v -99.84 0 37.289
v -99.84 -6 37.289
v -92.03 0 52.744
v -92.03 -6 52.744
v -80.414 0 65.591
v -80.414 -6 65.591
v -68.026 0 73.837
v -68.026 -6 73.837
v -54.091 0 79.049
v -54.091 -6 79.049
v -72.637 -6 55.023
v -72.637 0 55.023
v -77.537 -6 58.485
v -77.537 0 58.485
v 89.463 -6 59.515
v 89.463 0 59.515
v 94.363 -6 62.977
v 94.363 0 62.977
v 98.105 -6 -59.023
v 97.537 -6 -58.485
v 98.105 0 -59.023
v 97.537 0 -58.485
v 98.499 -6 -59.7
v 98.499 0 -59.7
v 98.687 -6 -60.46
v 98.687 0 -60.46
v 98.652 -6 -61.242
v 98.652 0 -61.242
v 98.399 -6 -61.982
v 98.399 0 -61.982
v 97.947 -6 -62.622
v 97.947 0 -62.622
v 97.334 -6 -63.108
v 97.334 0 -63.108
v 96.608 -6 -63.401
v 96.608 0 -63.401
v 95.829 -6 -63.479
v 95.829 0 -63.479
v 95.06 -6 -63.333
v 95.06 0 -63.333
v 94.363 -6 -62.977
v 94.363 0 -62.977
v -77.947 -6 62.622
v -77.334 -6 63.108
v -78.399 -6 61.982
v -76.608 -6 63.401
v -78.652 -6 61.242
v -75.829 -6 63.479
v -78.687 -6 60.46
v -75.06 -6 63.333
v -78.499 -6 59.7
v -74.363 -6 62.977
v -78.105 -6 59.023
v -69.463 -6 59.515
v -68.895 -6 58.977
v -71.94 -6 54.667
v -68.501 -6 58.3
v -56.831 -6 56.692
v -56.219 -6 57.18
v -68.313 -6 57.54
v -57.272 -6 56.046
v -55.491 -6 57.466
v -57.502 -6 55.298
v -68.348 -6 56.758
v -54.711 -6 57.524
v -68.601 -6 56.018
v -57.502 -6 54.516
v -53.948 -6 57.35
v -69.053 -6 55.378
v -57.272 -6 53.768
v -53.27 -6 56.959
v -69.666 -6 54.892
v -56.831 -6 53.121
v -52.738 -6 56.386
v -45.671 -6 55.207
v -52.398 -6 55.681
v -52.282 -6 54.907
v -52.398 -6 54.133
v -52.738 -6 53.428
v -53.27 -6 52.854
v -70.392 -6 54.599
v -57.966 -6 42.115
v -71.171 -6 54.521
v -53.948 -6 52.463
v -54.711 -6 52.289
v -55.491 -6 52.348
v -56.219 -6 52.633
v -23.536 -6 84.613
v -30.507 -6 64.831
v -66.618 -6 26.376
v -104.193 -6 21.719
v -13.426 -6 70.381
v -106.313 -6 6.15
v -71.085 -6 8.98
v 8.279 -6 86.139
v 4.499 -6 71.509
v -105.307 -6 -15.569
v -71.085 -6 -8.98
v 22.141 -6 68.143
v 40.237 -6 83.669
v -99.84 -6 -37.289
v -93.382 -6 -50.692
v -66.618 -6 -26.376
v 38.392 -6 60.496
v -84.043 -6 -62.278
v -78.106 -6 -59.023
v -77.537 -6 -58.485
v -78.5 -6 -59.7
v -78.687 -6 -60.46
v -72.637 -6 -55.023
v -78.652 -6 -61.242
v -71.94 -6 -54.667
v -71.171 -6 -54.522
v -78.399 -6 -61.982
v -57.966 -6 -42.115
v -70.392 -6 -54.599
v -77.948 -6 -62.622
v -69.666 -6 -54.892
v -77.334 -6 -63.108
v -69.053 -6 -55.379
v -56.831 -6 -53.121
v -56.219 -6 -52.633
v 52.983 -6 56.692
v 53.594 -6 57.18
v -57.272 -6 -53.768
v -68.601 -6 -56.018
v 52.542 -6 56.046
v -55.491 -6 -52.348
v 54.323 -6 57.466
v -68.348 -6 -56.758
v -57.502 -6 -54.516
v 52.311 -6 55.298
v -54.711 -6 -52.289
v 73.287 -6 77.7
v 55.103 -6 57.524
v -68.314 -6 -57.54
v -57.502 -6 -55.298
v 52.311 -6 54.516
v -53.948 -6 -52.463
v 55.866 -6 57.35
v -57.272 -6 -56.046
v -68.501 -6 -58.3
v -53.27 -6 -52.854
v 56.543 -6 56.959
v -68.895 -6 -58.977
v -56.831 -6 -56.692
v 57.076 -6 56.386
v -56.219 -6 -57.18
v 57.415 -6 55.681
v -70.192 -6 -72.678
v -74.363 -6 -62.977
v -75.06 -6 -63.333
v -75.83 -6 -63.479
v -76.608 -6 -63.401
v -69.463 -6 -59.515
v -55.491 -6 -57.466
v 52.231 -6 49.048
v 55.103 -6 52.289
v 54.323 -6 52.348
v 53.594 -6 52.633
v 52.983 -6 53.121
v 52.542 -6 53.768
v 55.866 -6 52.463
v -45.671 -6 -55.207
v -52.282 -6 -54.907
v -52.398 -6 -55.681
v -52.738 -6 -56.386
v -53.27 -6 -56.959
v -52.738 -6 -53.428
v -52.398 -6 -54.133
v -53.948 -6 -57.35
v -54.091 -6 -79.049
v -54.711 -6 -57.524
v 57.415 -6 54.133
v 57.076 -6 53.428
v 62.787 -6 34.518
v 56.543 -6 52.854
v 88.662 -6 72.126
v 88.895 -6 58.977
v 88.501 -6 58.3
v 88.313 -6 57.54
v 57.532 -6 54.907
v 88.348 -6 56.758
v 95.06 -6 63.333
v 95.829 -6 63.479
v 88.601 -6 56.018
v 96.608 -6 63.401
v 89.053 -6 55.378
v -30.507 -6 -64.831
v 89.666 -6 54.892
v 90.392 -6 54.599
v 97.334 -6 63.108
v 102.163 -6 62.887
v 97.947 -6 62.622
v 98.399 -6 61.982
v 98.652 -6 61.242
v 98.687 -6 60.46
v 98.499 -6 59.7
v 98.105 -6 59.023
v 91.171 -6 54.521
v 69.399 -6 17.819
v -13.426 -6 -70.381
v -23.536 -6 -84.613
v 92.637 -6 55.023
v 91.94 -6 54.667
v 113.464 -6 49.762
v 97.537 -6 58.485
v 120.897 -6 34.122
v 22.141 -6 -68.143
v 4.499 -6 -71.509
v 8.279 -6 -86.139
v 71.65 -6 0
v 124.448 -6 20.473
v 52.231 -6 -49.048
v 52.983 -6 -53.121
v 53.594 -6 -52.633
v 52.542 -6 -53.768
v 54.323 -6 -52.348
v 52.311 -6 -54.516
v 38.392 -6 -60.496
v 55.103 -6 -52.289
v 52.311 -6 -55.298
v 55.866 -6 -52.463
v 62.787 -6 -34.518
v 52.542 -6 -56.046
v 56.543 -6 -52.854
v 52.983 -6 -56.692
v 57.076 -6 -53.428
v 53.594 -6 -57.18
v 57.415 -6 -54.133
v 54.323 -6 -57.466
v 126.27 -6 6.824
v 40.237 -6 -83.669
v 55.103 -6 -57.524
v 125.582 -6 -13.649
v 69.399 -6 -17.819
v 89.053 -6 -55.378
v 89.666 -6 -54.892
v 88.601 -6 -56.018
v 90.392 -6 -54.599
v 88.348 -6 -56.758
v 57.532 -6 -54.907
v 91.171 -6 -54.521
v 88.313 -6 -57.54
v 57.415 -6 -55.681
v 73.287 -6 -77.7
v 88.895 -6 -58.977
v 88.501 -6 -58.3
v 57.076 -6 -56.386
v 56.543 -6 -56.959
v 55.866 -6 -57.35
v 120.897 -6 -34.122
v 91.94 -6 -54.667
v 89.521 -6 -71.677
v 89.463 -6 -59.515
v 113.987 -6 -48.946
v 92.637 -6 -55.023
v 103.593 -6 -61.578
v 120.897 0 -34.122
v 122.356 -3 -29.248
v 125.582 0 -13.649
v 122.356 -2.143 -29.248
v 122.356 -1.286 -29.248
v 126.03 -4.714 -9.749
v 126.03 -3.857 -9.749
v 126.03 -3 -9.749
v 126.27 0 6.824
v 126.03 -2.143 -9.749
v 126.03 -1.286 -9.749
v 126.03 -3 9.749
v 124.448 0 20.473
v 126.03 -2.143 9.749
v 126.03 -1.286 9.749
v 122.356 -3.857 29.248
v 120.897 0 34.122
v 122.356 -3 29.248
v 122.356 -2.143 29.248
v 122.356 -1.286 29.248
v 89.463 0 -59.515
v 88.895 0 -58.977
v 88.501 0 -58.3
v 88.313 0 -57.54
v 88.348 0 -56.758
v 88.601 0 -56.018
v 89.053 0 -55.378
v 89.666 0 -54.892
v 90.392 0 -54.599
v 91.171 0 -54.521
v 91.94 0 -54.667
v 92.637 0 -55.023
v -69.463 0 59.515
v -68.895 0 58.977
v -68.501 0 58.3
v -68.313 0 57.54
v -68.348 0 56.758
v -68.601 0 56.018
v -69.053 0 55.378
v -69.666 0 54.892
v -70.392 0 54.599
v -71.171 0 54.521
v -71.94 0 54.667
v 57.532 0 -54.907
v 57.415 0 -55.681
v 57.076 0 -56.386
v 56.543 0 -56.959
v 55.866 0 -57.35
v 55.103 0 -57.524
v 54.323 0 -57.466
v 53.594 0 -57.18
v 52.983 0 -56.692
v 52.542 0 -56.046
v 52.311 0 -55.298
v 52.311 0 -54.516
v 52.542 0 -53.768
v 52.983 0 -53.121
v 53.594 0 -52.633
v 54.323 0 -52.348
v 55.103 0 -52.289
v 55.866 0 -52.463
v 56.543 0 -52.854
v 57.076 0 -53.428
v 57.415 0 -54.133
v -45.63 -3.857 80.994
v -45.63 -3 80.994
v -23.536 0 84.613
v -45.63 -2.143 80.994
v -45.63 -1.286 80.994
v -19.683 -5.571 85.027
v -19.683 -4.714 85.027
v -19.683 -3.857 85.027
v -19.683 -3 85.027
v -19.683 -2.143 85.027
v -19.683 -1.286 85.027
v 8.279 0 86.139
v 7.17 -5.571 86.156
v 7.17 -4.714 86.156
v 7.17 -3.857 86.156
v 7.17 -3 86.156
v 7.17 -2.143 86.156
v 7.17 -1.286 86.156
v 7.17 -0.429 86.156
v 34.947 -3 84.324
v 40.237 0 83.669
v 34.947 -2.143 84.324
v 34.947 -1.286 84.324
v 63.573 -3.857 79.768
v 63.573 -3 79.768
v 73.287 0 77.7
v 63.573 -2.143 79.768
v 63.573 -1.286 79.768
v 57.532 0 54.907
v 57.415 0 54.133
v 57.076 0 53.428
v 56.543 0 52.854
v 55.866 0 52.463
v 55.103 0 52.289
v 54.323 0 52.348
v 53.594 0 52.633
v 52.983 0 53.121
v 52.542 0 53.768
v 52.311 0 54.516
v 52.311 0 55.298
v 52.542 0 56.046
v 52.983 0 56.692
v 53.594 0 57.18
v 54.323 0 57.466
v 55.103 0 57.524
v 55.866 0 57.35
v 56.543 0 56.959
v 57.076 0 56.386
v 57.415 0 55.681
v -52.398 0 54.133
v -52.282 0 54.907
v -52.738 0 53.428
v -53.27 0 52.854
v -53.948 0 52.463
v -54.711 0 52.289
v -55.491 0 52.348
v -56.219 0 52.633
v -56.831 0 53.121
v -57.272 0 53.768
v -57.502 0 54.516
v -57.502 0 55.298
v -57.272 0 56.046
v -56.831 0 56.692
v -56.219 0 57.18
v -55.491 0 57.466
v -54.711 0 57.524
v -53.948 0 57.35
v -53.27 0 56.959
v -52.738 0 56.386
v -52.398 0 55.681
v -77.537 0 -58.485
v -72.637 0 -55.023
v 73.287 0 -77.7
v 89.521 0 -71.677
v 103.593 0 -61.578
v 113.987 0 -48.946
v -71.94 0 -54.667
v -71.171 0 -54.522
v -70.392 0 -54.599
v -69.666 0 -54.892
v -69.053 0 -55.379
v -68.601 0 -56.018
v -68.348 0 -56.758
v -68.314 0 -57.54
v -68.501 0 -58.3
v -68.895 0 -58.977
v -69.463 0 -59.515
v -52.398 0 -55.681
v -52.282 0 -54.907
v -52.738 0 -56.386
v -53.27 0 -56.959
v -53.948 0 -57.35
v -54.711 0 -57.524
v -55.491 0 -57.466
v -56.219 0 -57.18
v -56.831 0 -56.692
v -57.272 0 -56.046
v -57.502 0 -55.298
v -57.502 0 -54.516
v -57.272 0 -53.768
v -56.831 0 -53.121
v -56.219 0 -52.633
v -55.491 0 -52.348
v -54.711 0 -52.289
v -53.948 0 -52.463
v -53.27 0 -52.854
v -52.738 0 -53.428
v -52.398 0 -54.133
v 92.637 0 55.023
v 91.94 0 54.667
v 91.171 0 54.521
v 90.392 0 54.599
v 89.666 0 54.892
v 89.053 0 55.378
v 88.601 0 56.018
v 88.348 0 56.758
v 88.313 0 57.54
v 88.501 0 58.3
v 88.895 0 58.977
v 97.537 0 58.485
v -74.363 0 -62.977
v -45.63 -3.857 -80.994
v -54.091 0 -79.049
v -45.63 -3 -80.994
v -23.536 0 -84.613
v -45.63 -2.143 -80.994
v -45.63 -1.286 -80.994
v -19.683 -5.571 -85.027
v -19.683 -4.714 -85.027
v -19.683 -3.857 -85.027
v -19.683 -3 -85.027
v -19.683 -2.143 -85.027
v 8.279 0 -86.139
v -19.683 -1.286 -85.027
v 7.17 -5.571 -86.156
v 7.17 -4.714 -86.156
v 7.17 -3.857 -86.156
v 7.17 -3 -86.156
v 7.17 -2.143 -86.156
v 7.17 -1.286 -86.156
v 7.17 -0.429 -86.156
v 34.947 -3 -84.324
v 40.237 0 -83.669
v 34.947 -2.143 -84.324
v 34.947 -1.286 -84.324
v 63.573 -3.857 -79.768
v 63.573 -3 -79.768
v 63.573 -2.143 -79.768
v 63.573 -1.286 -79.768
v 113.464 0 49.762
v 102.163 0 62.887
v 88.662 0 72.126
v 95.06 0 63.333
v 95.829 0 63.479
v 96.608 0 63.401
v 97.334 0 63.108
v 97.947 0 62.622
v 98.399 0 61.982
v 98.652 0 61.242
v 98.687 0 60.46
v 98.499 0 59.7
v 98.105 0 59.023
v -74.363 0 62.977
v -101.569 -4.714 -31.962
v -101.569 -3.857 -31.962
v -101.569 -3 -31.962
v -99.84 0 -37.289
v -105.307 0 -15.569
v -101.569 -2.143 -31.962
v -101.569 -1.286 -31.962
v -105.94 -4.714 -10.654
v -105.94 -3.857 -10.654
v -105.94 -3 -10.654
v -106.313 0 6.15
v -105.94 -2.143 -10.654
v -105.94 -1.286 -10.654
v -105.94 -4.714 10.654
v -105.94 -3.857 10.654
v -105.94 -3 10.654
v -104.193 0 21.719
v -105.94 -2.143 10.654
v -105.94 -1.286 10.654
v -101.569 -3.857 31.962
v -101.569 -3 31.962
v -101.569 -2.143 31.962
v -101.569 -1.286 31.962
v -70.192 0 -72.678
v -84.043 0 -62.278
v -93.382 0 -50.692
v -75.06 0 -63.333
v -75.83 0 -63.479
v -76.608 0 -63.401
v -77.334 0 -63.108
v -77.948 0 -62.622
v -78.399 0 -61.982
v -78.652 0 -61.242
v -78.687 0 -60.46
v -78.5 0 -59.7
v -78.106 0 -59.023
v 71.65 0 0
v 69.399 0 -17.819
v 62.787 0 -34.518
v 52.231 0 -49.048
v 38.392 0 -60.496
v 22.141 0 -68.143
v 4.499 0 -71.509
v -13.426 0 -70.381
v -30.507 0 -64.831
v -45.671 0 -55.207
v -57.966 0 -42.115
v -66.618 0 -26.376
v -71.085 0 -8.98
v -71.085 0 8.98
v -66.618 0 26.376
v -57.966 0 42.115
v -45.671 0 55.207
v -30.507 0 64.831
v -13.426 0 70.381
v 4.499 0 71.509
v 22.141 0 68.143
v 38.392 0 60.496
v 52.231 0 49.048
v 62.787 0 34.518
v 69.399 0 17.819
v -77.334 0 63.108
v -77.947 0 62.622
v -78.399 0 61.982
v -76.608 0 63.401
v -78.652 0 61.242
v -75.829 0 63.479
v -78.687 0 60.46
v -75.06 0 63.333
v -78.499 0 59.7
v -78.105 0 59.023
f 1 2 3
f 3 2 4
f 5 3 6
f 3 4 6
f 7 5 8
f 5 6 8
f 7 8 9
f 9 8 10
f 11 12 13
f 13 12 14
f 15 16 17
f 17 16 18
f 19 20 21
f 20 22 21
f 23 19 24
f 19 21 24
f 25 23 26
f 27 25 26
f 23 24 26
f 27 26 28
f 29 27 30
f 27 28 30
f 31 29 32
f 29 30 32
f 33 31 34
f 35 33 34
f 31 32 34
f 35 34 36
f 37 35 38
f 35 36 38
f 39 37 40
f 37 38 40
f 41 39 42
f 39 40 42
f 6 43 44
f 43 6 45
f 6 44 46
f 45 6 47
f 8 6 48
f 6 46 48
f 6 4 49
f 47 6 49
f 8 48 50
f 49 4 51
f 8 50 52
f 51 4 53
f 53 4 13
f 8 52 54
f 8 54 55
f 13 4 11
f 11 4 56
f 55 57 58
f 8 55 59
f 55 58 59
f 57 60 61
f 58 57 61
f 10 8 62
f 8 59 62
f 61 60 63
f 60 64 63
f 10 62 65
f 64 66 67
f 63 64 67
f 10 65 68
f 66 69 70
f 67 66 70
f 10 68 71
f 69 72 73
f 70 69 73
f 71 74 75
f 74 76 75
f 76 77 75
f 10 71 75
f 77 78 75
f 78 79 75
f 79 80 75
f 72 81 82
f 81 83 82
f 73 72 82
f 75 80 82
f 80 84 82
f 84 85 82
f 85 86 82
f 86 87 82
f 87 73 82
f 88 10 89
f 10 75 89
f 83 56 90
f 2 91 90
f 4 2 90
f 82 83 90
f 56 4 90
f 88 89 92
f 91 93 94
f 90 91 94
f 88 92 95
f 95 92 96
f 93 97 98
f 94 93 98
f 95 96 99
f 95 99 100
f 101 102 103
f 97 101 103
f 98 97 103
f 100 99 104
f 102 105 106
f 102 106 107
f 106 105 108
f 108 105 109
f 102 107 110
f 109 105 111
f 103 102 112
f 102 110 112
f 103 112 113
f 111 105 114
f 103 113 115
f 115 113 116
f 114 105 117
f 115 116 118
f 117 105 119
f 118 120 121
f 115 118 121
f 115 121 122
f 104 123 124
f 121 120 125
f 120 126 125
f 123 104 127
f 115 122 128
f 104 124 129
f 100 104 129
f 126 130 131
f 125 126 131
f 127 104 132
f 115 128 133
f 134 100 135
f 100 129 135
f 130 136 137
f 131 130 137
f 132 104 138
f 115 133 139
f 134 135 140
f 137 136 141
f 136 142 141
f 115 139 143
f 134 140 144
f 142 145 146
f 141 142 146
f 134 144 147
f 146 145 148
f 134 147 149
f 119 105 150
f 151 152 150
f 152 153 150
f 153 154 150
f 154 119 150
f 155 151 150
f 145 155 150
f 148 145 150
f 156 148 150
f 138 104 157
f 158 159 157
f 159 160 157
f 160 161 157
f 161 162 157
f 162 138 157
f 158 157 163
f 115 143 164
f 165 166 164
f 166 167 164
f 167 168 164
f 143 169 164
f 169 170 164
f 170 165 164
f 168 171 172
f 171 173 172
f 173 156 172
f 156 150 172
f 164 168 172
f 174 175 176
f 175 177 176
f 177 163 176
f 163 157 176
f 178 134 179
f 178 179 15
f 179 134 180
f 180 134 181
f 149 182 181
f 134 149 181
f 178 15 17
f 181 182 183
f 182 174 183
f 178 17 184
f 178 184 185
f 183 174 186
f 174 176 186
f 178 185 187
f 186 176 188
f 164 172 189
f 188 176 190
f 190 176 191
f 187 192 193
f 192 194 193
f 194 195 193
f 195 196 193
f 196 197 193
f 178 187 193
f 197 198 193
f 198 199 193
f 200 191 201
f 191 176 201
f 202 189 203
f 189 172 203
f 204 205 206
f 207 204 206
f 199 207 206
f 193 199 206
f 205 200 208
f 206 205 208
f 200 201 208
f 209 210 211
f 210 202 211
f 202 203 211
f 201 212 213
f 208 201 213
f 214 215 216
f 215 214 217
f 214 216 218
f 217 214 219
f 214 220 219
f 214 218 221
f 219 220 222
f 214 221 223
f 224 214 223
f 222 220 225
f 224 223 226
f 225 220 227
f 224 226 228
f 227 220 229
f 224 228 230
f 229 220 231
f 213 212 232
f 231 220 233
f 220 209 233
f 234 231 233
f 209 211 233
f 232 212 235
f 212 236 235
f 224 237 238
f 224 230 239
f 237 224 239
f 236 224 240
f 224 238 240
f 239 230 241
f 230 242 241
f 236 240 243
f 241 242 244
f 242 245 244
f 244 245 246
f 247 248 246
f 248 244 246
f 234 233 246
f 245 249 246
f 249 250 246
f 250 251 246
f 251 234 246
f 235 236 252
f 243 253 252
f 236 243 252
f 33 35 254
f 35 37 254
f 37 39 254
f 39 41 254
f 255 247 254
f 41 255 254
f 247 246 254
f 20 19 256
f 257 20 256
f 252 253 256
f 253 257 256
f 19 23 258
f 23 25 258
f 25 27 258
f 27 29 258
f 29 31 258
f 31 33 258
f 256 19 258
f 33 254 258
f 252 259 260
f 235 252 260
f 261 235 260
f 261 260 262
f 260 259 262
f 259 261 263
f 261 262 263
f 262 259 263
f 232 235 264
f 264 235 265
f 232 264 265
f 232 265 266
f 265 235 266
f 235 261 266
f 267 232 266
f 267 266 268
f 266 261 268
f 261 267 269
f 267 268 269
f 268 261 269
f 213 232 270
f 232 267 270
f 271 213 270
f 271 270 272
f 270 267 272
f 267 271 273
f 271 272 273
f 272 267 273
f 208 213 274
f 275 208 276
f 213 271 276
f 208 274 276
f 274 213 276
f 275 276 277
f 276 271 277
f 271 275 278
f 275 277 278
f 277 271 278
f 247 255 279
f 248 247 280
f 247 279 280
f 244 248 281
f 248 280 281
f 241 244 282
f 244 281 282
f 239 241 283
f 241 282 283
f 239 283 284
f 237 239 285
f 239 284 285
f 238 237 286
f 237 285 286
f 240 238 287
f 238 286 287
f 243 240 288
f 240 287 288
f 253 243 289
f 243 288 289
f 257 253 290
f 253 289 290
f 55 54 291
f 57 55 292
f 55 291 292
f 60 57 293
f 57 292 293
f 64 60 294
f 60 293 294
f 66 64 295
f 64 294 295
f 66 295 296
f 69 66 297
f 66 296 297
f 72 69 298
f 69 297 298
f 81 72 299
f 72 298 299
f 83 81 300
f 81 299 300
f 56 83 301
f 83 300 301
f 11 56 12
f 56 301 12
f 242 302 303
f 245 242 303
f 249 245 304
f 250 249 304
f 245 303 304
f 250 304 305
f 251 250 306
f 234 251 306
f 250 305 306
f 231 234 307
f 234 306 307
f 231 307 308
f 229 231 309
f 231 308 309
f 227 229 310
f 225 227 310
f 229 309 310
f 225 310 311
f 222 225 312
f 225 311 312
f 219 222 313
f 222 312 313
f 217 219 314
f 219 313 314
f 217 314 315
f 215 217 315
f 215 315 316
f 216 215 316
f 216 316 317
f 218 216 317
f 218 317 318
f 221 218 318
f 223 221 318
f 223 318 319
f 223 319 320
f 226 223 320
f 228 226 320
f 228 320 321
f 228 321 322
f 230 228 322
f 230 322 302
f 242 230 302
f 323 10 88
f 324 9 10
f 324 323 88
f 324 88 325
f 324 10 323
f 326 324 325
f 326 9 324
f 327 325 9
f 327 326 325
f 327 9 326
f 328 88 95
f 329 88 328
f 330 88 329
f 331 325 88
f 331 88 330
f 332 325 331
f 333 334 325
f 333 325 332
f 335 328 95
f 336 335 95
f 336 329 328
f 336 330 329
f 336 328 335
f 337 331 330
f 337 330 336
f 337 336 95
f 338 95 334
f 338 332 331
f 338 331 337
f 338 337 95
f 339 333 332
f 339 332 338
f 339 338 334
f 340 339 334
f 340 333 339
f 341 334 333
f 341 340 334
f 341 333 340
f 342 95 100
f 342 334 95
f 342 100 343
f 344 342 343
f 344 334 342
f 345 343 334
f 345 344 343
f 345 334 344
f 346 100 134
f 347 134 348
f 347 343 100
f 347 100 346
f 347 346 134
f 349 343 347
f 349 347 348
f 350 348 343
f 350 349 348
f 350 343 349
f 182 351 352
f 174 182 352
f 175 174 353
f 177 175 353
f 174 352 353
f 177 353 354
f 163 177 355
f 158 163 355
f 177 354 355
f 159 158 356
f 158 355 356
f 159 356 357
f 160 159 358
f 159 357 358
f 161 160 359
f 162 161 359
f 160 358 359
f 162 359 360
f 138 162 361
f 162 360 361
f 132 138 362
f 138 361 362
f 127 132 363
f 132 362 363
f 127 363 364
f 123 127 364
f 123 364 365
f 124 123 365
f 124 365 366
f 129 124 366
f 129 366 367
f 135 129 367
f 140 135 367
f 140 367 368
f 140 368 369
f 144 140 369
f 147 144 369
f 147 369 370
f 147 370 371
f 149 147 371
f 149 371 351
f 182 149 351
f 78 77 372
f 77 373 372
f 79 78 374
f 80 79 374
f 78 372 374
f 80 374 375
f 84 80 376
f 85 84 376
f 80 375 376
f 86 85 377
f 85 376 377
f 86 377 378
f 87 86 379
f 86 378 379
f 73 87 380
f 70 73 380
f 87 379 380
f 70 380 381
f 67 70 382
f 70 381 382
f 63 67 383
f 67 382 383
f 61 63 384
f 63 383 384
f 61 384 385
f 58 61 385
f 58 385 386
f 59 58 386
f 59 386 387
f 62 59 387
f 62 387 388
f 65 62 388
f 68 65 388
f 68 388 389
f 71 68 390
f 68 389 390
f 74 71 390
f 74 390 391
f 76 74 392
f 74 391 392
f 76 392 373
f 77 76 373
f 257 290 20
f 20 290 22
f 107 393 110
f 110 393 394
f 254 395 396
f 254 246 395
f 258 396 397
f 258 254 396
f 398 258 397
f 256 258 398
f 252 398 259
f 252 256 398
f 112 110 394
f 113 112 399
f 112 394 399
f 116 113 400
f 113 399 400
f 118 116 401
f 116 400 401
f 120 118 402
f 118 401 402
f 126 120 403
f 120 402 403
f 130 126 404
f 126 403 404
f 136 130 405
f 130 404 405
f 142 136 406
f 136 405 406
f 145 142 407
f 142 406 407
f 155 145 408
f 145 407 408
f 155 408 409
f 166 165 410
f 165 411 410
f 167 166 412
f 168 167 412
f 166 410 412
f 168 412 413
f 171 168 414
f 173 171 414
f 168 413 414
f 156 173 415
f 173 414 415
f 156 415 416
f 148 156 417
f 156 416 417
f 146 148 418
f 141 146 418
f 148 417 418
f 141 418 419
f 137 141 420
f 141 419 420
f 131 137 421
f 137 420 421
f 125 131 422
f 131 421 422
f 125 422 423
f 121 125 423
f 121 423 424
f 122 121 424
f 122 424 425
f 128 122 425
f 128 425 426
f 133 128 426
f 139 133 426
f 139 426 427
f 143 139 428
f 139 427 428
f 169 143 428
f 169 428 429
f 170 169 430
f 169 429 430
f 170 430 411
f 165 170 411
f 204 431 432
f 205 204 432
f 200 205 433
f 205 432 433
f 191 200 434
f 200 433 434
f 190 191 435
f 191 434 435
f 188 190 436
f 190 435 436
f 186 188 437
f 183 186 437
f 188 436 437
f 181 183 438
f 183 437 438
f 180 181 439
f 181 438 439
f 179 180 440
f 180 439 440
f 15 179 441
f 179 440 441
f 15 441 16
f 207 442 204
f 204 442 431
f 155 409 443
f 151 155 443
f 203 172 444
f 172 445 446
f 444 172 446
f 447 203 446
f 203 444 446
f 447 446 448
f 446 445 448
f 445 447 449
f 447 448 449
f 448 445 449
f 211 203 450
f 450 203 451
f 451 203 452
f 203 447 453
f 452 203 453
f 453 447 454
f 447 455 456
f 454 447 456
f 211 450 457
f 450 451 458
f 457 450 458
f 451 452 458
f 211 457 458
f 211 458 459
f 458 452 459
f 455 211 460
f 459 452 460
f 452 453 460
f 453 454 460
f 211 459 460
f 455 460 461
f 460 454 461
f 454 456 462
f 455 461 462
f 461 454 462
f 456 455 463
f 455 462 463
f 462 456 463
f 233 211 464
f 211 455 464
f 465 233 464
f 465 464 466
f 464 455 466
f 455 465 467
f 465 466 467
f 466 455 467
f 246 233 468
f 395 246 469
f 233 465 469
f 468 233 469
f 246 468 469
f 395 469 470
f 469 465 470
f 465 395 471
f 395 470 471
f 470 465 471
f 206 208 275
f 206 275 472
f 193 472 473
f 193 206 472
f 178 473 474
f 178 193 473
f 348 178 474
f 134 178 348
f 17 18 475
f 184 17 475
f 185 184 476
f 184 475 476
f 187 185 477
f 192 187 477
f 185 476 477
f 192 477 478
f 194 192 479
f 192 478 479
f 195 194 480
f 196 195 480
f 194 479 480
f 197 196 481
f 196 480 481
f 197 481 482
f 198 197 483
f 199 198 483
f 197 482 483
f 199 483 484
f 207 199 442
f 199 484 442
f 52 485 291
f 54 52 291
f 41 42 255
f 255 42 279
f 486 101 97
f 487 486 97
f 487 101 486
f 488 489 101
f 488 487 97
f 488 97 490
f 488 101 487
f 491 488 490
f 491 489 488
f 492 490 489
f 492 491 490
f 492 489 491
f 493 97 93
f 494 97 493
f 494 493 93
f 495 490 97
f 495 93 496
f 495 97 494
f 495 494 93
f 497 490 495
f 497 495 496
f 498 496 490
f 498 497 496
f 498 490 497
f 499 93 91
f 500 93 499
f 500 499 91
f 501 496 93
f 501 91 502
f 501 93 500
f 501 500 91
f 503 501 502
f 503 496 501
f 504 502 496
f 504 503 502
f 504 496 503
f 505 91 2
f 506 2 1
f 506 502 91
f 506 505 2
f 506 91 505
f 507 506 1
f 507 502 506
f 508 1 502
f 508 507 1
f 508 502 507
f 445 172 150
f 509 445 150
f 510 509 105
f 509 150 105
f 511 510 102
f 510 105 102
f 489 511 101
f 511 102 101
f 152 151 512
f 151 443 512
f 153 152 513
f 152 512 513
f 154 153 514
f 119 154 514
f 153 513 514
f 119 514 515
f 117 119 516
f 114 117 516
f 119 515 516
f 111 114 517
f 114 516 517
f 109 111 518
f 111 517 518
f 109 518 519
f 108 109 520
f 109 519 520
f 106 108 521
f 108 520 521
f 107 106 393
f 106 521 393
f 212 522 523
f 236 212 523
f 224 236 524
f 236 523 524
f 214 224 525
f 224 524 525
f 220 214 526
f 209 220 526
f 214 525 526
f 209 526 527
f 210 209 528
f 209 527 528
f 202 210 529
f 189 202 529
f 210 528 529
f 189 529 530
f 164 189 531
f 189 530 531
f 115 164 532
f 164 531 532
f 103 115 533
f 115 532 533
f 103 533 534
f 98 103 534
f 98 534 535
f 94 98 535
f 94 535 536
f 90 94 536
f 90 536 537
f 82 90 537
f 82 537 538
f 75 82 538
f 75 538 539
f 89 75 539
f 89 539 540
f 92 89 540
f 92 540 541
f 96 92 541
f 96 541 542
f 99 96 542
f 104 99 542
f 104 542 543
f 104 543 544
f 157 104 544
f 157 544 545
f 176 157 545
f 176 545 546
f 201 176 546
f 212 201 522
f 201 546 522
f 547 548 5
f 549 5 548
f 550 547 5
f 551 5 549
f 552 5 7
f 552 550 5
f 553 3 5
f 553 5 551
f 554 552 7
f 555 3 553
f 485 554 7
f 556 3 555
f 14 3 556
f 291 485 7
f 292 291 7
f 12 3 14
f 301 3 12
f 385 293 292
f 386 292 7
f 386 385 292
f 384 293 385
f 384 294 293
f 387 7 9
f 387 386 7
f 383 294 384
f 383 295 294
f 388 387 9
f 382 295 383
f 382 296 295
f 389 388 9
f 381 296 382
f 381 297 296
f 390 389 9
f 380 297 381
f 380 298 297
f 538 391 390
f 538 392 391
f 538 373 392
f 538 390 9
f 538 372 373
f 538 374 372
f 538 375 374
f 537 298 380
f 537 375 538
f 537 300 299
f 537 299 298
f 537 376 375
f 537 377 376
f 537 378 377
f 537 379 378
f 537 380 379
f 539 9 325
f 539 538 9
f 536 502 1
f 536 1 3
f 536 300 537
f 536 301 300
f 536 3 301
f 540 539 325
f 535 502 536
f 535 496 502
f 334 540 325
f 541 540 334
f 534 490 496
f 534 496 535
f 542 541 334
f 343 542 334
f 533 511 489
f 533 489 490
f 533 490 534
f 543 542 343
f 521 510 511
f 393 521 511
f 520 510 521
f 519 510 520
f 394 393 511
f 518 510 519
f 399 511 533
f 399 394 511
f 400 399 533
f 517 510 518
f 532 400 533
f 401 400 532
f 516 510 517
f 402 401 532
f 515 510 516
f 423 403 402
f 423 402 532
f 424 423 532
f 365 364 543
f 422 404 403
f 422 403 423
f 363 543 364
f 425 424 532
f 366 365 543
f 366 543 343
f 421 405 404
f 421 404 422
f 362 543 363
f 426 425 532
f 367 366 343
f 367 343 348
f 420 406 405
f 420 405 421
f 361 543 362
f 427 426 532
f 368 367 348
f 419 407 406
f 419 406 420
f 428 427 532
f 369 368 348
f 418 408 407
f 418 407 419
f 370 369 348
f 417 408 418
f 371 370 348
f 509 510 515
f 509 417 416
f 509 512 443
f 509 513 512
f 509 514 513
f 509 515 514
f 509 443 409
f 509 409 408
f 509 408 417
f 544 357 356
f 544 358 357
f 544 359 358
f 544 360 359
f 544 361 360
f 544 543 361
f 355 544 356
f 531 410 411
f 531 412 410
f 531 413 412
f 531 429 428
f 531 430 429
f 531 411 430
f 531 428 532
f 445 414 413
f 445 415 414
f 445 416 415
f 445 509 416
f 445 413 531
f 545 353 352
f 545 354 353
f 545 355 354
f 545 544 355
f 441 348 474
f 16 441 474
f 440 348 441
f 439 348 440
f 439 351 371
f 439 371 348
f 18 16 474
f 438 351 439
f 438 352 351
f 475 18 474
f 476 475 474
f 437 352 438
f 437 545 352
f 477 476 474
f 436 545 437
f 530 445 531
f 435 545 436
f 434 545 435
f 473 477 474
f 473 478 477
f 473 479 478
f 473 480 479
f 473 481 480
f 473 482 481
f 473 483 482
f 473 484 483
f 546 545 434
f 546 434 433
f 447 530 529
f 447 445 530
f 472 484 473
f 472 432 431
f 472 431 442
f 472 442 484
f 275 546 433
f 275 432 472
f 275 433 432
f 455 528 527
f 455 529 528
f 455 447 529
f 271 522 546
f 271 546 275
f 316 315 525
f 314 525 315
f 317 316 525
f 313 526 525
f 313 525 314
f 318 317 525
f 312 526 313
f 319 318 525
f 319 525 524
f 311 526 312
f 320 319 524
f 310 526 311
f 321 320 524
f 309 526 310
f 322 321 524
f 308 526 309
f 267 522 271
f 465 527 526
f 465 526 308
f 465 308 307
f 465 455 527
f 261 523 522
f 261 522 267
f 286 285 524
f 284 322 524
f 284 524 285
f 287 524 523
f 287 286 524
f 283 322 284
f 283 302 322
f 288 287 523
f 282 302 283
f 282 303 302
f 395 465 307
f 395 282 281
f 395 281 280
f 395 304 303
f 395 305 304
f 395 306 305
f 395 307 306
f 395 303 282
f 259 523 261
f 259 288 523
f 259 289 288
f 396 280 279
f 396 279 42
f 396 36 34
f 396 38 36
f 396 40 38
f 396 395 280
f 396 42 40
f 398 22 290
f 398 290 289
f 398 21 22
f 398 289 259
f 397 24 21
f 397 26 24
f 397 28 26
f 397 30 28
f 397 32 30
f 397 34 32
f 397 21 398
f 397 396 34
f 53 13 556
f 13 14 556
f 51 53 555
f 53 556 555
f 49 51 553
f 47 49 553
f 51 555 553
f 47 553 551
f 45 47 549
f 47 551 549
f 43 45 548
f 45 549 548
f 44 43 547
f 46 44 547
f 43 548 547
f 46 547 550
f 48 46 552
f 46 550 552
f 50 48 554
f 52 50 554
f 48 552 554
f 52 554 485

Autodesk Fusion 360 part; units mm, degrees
sketch "Sketch1" plane through (0, 0, 0) normal (0, 1, 0) x (1, 0, 0)
  circle A0 centre (0, 0) radius 71.65
  circle A1 centre (0, 0) radius 83.65
  circle A2 centre (0, 0) radius 86.15 construction
  line L0 (0, 0) -> (10, 0) construction
  line L1 (-106.5, 0) -> (126.5, 0) construction
  line L2 (-84.5, -69.5) -> (104.5, -69.5) construction
  line L3 (104.5, -69.5) -> (104.5, 69.5) construction
  line L4 (104.5, 69.5) -> (-84.5, 69.5) construction
  line L5 (-84.5, 69.5) -> (-84.5, -69.5) construction
  line L6 (-84.5, -69.5) -> (104.5, 69.5) construction
  line L7 (104.5, -69.5) -> (-84.5, 69.5) construction
  line L8 (93.5, -59) -> (-73.5, -59) construction
  line L9 (-73.5, -59) -> (-73.5, 59) construction
  line L10 (-73.5, 59) -> (93.5, 59) construction
  line L11 (93.5, 59) -> (93.5, -59) construction
  line L12 (93.5, -59) -> (-73.5, 59) construction
  line L13 (-73.5, -59) -> (93.5, 59) construction
  line L14 (0, 86.15) -> (0, -86.15) construction
  circle A3 centre (0, 0) radius 77.65 construction
  line L15 (0, 0) -> (54.9068, -54.9068) construction
  line L16 (0, 0) -> (77.65, 0) construction
  point P0 (10, 0)
  point P1 (10, 0)
  dimension "d1" = 143.3
  dimension "d2" = 167.3
  dimension "d3" = 172.3
  dimension "d5" = 10
  dimension "d6" = 233
  dimension "d7" = 189
  dimension "d8" = 139
  dimension "d9" = 167
  dimension "d10" = 118
  dimension "d22" = 155.3
  dimension "d23" = 45
sketch "Sketch2" plane through (0, 0, 0) normal (0, 1, 0) x (1, 0, 0)
  spline S0 degree 5 poles (-84.5, 69.5) (-81.1215, 70.7869) (-74.3286, 73.2455) (-64.0315, 76.5883) (-50.083, 80.3433) (-32.2585, 83.7904) (-14.0132, 85.8889) (4.6825, 86.5435) (23.8364, 85.73) (43.4214, 83.5343) (63.4013, 80.0731) (79.6732, 76.3808) (92.0287, 73.1261) (100.3319, 70.7441) (104.5, 69.5) knots 0 0 0 0 0 0 0.1 0.2 0.3 0.4 0.5 0.6 0.7 0.8 0.9 1 1 1 1 1 1
  line L0 (104.5, 69.5) -> (-84.5, 69.5)
  spline S1 degree 5 poles (-84.5, -69.5) (-81.1215, -70.7869) (-74.3286, -73.2455) (-64.0315, -76.5883) (-50.083, -80.3433) (-32.2585, -83.7904) (-14.0132, -85.8889) (4.6825, -86.5435) (23.8364, -85.73) (43.4214, -83.5343) (63.4013, -80.0731) (79.6732, -76.3808) (92.0287, -73.1261) (100.3319, -70.7441) (104.5, -69.5) knots 0 0 0 0 0 0 0.1 0.2 0.3 0.4 0.5 0.6 0.7 0.8 0.9 1 1 1 1 1 1
  line L1 (104.5, -69.5) -> (104.5, 69.5)
  spline S2 degree 5 poles (-84.5, 69.5) (-86.1686, 66.72) (-89.3602, 61.16) (-93.7104, 52.82) (-98.6219, 41.7) (-103.1794, 27.8) (-106.0136, 13.9) (-106.9839, 0) (-106.0136, -13.9) (-103.1794, -27.8) (-98.6219, -41.7) (-93.7104, -52.82) (-89.3602, -61.16) (-86.1686, -66.72) (-84.5, -69.5) knots 0 0 0 0 0 0 0.1 0.2 0.3 0.4 0.5 0.6 0.7 0.8 0.9 1 1 1 1 1 1
  spline S3 degree 5 poles (104.5, 69.5) (106.1686, 66.72) (109.3602, 61.16) (113.7104, 52.82) (118.6219, 41.7) (123.1794, 27.8) (126.0136, 13.9) (126.9839, 0) (126.0136, -13.9) (123.1794, -27.8) (118.6219, -41.7) (113.7104, -52.82) (109.3602, -61.16) (106.1686, -66.72) (104.5, -69.5) knots 0 0 0 0 0 0 0.1 0.2 0.3 0.4 0.5 0.6 0.7 0.8 0.9 1 1 1 1 1 1
  point P0 (0, 86.15)
  point P1 (-84.5, 69.5)
  point P2 (0, 86.15)
  point P3 (104.5, 69.5)
  point P4 (0, -86.15)
  point P5 (-84.5, -69.5)
  point P6 (0, -86.15)
  point P7 (104.5, -69.5)
  point P8 (-106.5, 0)
  point P9 (-106.5, 0)
  point P10 (126.5, 0)
  point P11 (126.5, 0)
sketch "Sketch3" plane through (0, 0, 0) normal (0, 1, 0) x (1, 0, 0)
  line L0 (-77.5372, 58.4854) -> (-72.637, 55.023)
  arc A0 (-72.637, 55.023) -> (-69.4632, 59.5149) centre (-71.0501, 57.2689) ccw
  line L1 (-69.4632, 59.5149) -> (-74.3634, 62.9773)
  arc A1 (-74.3634, 62.9773) -> (-77.5372, 58.4854) centre (-75.9503, 60.7313) ccw
  line L2 (-75.9503, 60.7313) -> (-71.0501, 57.2689) construction
  line L3 (93.5, -59) -> (-73.5, 59)
  line L4 (-73.5, -59) -> (93.5, 59)
  line L5 (94.3632, 62.9771) -> (89.463, 59.5147)
  arc A2 (89.463, 59.5147) -> (92.6368, 55.0229) centre (91.0499, 57.2688) ccw
  line L6 (92.6368, 55.0229) -> (97.537, 58.4853)
  arc A3 (97.537, 58.4853) -> (94.3632, 62.9771) centre (95.9501, 60.7312) ccw
  line L7 (95.9501, 60.7312) -> (91.0499, 57.2688) construction
  line L8 (97.537, -58.4853) -> (92.6368, -55.0229)
  arc A4 (92.6368, -55.0229) -> (89.463, -59.5147) centre (91.0499, -57.2688) ccw
  line L9 (89.463, -59.5147) -> (94.3632, -62.9771)
  arc A5 (94.3632, -62.9771) -> (97.537, -58.4853) centre (95.9501, -60.7312) ccw
  line L10 (95.9501, -60.7312) -> (91.0499, -57.2688) construction
  line L11 (-74.3632, -62.9771) -> (-69.463, -59.5147)
  arc A6 (-69.463, -59.5147) -> (-72.6368, -55.0229) centre (-71.0499, -57.2688) ccw
  line L12 (-72.6368, -55.0229) -> (-77.537, -58.4853)
  arc A7 (-77.537, -58.4853) -> (-74.3632, -62.9771) centre (-75.9501, -60.7312) ccw
  line L13 (-75.9501, -60.7312) -> (-71.0499, -57.2688) construction
  line L14 (-80.541, 57.6998) -> (-72.374, 51.9291)
  arc A8 (-72.374, 51.9291) -> (-66.459, 60.3002) centre (-69.4165, 56.1147) ccw
  line L15 (-66.459, 60.3002) -> (-74.626, 66.0709)
  arc A9 (-74.626, 66.0709) -> (-80.541, 57.6998) centre (-77.5835, 61.8853) ccw
  line L16 (-77.5835, 61.8853) -> (-69.4165, 56.1147) construction
  line L17 (94.571, 66.032) -> (86.404, 60.2613)
  arc A10 (86.404, 60.2613) -> (92.3189, 51.8902) centre (89.3615, 56.0758) ccw
  line L18 (92.3189, 51.8902) -> (100.4859, 57.6609)
  arc A11 (100.4859, 57.6609) -> (94.571, 66.032) centre (97.5284, 61.8464) ccw
  line L19 (97.5284, 61.8464) -> (89.3615, 56.0758) construction
  line L20 (100.541, -57.6998) -> (92.374, -51.9291)
  arc A12 (92.374, -51.9291) -> (86.459, -60.3002) centre (89.4165, -56.1147) ccw
  line L21 (86.459, -60.3002) -> (94.626, -66.0709)
  arc A13 (94.626, -66.0709) -> (100.541, -57.6998) centre (97.5835, -61.8853) ccw
  line L22 (97.5835, -61.8853) -> (89.4165, -56.1147) construction
  line L23 (-74.626, -66.0709) -> (-66.459, -60.3002)
  arc A14 (-66.459, -60.3002) -> (-72.374, -51.9291) centre (-69.4165, -56.1147) ccw
  line L24 (-72.374, -51.9291) -> (-80.541, -57.6998)
  arc A15 (-80.541, -57.6998) -> (-74.626, -66.0709) centre (-77.5835, -61.8853) ccw
  line L25 (-77.5835, -61.8853) -> (-69.4165, -56.1147) construction
  point P0 (-73.5002, 59.0001)
  point P1 (93.5, 59)
  point P2 (93.5, -59)
  point P3 (-73.5, -59)
  point P4 (-73.5, 59)
  point P5 (93.4449, 58.9611)
  point P6 (93.5, -59)
  point P7 (-73.5, -59)
  dimension "d12" = 3
  dimension "d13" = 5.5
  dimension "d16" = 5.5
  dimension "d17" = 3
  dimension "d18" = 3
  dimension "d19" = 5.5
  dimension "d20" = 3
  dimension "d21" = 5.5
  dimension "d30" = 10.25
  dimension "d31" = 10.25
  dimension "d32" = 10.25
  dimension "d33" = 10.25
sketch "Sketch4" plane through (0, 0, 0) normal (0, 1, 0) x (1, 0, 0)
  circle A0 centre (54.9068, -54.9068) radius 2.625
  circle A1 centre (54.9068, -54.9068) radius 6
  circle A2 centre (54.9068, 54.9068) radius 2.625
  circle A3 centre (54.9068, 54.9068) radius 6
  circle A4 centre (-54.9068, 54.9068) radius 2.625
  circle A5 centre (-54.9068, 54.9068) radius 6
  circle A6 centre (-54.9068, -54.9068) radius 2.625
  circle A7 centre (-54.9068, -54.9068) radius 6
  point P0 (54.9068, -54.9068)
  dimension "d24" = 5.25
  dimension "d25" = 12
  dimension "d27" = 360
extrude "Extrude1" add sketch "Sketch2" against normal blind 6
extrude "Extrude4" cut sketch "Sketch3" sketch "Sketch4" sketch "Sketch1" along normal up to surface contours L0 A0 L1 A1 | L5 A2 L6 A3 | L8 A4 L9 A5 | L11 A6 L12 A7 of sketch 2 contours A0 | A2 | A4 | A6 of sketch 3 contours A0 end surface through (0, -6, 0) normal (0, -1, 0) offset 0
fillet "Fillet2" radius 65 4 edges at (104.5, -3, 69.5) (104.5, -3, -69.5) (-84.5, -3, 69.5) (-84.5, -3, -69.5)
